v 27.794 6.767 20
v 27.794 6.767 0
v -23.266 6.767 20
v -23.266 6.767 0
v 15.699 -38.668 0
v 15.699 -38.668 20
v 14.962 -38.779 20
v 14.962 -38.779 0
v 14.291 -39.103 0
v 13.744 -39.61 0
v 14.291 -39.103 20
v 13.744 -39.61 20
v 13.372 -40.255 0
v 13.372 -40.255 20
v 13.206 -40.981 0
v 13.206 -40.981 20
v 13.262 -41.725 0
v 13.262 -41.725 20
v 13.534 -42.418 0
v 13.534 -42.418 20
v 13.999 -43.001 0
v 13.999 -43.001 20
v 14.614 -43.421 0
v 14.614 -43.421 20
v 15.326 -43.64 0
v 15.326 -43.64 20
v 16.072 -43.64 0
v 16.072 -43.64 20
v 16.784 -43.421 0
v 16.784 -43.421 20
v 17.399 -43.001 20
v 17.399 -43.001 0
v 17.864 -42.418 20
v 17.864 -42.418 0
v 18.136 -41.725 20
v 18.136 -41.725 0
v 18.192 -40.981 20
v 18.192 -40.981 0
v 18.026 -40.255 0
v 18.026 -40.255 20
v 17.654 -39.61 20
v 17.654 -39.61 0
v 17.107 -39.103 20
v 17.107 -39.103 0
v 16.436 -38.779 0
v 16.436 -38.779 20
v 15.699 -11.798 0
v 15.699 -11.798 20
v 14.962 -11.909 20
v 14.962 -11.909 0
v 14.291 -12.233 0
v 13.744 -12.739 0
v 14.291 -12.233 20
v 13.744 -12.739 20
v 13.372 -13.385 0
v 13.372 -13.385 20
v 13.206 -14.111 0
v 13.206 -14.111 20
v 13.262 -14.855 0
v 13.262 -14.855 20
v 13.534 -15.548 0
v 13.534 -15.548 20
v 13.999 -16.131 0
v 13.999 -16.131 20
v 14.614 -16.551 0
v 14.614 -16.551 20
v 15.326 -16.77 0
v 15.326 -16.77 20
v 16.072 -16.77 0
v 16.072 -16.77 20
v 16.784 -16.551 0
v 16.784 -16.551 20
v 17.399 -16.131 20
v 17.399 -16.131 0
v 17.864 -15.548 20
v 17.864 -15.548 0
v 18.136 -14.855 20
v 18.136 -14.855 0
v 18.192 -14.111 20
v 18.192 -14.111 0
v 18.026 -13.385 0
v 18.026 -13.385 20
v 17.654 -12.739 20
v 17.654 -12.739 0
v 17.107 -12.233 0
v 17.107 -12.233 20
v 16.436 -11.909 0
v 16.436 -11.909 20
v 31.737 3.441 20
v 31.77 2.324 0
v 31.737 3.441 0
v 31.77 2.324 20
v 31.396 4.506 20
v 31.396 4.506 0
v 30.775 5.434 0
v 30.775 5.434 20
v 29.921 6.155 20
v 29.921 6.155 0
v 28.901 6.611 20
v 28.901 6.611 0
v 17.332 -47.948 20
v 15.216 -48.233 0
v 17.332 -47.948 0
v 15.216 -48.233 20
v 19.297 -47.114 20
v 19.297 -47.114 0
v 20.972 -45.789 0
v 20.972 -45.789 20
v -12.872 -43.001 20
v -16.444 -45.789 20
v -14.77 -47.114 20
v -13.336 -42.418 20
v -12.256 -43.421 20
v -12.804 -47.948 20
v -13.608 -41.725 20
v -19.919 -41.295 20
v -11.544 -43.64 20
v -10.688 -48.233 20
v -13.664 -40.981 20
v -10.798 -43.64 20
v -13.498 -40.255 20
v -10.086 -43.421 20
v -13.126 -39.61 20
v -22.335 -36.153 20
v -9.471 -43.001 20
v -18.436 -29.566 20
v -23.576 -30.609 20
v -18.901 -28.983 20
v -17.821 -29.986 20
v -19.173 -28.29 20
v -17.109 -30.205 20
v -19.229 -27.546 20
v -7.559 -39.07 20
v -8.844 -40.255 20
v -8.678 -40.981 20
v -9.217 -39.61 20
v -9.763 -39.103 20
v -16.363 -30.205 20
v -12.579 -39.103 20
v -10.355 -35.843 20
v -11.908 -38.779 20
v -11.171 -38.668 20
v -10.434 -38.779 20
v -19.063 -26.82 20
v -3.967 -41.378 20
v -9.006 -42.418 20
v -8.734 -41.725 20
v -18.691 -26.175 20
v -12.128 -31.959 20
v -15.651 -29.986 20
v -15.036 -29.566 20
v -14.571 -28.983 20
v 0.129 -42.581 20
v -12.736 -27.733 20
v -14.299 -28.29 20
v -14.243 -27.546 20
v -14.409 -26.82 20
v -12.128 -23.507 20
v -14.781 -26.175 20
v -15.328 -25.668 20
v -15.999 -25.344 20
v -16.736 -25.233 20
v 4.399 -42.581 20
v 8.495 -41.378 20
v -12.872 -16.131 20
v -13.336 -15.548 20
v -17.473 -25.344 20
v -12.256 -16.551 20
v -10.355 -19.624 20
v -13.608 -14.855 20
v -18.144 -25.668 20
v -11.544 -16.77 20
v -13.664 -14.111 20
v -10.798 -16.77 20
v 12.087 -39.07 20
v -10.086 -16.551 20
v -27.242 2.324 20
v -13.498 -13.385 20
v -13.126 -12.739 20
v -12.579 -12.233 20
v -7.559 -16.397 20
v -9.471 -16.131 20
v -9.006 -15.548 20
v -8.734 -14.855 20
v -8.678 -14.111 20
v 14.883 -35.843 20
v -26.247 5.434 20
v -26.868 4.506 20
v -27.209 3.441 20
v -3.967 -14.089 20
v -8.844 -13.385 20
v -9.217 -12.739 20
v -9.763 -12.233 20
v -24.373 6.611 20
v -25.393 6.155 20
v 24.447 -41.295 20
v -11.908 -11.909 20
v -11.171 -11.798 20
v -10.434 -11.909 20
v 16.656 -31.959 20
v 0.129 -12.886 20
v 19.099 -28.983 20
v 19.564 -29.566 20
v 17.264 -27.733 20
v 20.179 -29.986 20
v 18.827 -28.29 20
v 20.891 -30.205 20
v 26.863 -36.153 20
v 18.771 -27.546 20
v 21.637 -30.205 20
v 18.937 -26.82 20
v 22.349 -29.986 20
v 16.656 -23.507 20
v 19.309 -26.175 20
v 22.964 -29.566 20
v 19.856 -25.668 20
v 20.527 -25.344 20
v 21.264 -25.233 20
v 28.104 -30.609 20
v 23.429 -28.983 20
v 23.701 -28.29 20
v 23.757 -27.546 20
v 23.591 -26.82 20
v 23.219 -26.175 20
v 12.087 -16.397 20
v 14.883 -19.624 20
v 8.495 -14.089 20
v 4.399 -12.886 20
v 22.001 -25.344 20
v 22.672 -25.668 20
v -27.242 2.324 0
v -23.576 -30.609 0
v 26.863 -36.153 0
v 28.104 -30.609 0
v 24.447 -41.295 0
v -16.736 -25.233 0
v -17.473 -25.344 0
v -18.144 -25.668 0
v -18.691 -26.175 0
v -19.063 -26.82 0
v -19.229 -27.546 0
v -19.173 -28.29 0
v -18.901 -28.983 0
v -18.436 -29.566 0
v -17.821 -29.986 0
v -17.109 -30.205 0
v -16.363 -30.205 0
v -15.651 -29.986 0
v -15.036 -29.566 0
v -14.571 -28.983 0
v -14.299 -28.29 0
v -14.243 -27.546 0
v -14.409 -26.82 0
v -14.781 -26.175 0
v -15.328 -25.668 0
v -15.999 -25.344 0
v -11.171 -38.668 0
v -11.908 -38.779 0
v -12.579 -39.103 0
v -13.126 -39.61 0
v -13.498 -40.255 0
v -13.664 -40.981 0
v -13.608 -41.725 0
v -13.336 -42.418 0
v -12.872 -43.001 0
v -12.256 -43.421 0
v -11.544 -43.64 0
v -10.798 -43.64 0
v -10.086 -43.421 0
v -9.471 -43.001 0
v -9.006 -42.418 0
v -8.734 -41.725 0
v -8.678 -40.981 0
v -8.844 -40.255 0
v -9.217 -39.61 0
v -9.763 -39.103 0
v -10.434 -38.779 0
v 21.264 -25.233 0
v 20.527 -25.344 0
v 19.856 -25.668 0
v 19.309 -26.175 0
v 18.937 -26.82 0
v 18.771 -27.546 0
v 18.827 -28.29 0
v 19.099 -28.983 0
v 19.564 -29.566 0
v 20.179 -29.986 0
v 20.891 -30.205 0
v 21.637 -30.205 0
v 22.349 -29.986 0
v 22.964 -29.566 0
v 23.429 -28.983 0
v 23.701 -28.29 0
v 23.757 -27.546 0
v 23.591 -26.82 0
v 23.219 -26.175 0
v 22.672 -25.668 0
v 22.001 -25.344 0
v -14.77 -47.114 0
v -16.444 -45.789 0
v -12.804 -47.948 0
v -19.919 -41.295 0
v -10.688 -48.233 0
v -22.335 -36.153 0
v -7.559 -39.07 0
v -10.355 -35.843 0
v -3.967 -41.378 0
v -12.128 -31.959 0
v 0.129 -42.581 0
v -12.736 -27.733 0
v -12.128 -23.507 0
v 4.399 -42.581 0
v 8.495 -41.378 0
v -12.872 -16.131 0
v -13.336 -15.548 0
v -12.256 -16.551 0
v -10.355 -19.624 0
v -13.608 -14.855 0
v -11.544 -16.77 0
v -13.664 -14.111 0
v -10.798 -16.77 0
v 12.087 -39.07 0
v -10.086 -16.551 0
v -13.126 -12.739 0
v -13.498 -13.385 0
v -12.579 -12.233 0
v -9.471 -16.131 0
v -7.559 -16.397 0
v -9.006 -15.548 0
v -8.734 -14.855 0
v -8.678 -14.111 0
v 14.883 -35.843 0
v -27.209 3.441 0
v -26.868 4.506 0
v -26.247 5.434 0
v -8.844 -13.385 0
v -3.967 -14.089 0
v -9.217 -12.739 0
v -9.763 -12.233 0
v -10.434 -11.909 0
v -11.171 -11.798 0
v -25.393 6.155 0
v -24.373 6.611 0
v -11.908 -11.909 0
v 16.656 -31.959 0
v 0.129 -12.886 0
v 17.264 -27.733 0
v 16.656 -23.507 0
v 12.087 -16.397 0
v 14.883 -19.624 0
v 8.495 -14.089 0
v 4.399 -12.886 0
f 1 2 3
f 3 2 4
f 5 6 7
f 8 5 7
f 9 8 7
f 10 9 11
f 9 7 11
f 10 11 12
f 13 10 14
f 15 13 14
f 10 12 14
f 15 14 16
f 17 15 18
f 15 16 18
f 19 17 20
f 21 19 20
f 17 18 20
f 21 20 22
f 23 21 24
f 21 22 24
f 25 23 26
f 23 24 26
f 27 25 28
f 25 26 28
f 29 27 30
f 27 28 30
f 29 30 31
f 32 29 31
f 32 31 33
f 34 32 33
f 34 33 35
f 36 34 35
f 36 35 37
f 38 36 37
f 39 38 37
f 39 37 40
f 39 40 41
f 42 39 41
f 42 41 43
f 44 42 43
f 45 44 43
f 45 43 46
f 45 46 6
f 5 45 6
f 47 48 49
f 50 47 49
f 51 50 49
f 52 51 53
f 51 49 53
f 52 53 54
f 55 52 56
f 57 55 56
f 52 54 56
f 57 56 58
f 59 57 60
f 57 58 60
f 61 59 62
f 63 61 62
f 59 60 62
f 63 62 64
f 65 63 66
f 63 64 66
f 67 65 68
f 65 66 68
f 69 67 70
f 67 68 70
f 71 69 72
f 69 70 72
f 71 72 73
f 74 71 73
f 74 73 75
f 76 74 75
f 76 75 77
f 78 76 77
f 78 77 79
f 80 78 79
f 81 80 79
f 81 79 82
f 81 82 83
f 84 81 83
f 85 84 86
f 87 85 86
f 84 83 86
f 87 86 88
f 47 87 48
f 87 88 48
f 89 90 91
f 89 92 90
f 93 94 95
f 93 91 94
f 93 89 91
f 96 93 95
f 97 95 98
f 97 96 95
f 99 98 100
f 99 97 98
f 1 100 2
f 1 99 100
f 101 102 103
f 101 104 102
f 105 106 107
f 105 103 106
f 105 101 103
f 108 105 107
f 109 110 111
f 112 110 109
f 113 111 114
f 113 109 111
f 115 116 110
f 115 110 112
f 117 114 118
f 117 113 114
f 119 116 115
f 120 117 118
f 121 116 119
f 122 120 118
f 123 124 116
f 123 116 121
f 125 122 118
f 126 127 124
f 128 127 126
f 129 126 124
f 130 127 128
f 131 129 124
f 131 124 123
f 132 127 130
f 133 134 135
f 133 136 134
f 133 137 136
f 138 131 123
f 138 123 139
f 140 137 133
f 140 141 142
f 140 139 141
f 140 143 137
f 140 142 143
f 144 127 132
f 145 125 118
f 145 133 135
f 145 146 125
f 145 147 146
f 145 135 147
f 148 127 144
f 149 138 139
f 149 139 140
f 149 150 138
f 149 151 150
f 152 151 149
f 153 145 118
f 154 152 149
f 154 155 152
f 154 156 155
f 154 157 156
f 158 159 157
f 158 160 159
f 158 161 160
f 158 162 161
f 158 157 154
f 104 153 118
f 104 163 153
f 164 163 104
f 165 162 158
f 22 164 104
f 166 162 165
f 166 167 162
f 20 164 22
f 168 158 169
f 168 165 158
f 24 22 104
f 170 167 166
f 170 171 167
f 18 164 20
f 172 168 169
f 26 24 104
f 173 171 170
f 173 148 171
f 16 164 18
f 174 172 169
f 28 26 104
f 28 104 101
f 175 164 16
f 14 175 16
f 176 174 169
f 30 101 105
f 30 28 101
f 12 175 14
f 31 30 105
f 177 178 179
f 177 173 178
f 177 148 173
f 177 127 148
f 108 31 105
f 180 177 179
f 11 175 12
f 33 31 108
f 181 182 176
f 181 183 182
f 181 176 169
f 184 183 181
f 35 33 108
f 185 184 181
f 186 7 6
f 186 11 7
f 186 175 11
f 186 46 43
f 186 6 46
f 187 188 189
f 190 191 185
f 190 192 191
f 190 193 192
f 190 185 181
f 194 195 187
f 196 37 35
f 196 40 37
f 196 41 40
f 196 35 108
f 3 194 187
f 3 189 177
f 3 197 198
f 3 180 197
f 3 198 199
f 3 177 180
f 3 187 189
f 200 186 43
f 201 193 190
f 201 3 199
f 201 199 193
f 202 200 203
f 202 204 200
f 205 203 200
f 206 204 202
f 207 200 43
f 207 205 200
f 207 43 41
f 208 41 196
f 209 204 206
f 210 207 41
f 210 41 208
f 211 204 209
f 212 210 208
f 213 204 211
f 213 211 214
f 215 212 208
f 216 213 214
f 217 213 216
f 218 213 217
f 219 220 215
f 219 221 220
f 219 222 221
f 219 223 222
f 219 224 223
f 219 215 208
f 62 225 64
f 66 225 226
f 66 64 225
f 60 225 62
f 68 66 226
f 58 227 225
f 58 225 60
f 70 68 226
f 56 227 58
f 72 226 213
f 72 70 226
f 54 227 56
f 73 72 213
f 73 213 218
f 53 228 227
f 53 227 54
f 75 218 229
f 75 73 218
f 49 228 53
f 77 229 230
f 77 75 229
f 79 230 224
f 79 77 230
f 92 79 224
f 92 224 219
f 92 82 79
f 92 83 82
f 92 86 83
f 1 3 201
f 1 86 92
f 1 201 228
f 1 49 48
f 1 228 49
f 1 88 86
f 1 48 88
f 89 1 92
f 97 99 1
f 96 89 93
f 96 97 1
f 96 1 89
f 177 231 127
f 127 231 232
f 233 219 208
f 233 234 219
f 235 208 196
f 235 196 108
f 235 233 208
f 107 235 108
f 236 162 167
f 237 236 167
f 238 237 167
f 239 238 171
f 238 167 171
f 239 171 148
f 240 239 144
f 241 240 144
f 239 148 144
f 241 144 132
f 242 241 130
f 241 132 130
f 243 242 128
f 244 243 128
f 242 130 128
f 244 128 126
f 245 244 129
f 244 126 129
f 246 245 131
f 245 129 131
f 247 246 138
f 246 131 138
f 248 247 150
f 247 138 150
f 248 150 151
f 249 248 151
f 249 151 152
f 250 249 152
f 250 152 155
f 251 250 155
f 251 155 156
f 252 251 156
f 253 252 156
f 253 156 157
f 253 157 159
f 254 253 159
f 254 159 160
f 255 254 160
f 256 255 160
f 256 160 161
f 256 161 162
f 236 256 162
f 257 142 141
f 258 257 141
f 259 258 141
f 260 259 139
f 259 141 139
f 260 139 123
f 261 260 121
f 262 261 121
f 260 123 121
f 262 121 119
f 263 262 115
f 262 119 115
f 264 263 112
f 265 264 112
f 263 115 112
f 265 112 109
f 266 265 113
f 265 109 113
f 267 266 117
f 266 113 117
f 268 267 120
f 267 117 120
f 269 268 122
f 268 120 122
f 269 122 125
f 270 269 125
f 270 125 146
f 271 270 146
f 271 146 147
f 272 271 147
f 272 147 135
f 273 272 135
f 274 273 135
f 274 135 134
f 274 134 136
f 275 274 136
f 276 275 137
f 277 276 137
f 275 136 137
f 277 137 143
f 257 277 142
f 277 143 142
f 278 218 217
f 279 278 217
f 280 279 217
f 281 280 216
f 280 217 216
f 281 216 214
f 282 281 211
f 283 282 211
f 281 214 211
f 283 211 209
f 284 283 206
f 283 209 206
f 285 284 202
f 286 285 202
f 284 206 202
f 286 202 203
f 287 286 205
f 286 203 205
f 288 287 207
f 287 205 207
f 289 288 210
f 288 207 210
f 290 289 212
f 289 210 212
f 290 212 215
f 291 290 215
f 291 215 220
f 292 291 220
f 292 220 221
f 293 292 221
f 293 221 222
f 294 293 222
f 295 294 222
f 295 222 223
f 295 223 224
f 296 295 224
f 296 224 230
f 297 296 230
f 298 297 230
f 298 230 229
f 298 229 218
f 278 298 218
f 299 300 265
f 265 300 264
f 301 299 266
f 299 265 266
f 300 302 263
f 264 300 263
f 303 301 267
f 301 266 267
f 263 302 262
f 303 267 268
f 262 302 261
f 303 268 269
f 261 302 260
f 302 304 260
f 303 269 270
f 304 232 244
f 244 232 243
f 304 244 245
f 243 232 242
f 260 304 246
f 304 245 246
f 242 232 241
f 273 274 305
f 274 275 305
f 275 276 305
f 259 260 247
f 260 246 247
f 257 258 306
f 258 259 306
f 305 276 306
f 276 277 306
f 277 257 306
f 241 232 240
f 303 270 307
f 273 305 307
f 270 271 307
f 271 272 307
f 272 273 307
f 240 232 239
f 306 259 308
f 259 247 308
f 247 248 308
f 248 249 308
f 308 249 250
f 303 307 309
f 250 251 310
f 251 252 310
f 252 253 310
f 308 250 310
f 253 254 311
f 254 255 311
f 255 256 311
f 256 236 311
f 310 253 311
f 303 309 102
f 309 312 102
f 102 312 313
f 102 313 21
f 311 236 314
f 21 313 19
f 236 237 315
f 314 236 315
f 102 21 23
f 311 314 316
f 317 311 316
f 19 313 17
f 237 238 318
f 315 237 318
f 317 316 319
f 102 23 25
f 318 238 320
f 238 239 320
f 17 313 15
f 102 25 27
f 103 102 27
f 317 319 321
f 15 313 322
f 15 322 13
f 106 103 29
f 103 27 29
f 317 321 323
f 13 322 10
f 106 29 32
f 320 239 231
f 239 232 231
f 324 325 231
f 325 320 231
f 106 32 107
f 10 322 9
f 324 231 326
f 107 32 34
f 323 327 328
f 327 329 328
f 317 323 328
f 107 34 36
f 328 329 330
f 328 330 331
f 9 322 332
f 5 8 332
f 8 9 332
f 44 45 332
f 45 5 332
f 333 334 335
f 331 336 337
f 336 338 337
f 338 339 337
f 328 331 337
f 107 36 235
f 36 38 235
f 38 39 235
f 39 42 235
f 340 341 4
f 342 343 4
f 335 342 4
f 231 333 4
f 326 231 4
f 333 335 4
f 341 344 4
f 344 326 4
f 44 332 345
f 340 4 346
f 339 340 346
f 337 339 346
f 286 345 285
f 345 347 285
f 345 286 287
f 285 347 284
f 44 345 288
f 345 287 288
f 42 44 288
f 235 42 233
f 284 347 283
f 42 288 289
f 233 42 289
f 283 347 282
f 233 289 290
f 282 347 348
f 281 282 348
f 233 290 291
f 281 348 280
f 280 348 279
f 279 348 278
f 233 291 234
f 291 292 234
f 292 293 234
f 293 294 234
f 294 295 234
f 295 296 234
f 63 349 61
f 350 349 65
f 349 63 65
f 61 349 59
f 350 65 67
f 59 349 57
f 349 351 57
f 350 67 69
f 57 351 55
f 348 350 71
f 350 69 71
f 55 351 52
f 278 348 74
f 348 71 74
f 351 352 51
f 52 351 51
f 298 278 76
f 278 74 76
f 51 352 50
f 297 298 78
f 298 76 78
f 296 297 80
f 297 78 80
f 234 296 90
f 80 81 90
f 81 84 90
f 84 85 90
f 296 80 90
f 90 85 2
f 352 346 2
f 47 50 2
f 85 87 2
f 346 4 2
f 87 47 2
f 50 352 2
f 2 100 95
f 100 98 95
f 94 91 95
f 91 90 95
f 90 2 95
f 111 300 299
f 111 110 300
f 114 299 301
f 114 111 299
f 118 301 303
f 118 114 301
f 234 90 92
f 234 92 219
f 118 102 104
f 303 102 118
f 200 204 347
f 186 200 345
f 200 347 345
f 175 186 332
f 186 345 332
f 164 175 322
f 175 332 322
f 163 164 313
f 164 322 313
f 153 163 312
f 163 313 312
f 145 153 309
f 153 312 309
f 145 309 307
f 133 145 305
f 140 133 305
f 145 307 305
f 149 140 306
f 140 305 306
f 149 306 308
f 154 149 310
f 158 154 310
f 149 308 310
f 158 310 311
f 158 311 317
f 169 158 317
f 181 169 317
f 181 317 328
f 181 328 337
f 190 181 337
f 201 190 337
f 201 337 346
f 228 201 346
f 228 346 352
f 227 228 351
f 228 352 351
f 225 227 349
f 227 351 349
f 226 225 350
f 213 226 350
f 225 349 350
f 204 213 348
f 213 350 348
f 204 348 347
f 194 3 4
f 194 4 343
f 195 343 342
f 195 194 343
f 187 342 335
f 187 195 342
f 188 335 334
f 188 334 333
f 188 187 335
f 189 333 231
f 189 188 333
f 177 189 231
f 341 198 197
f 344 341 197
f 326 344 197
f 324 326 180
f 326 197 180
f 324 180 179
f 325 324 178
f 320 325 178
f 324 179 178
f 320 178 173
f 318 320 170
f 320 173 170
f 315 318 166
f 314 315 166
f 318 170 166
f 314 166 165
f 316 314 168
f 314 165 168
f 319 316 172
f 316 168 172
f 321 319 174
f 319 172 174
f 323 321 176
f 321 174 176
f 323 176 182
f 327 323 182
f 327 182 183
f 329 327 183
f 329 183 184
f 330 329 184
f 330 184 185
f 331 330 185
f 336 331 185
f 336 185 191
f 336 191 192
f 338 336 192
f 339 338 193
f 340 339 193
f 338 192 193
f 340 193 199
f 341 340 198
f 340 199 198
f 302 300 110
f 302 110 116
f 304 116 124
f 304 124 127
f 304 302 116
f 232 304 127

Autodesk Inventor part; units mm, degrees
ref_plane "YZ Plane" through (0, 0, 0) normal (1, 0, 0) x (0, 1, 0)
ref_plane "XZ Plane" through (0, 0, 0) normal (0, 1, 0) x (-1, 0, 0)
ref_plane "XY Plane" through (0, 0, 0) normal (0, 0, 1) x (1, 0, 0)
sketch "Szkic1" plane through (0, 0, 0) normal (0, 0, 1) x (1, 0, 0)
  line L0 (-47.736, 26.7667) -> (-47.736, 6.7667)
  line L1 (-47.736, 26.7667) -> (52.264, 26.7667)
  line L2 (52.264, 26.7667) -> (52.264, 6.7667)
  line L3 (52.264, 6.7667) -> (32.264, 6.7667)
  line L4 (32.264, 6.7667) -> (32.264, -48.2333)
  line L5 (32.264, -48.2333) -> (-27.736, -48.2333)
  line L6 (-27.736, -48.2333) -> (-27.736, 6.7667)
  line L7 (-27.736, 6.7667) -> (-47.736, 6.7667)
  circle A0 centre (2.264, -27.7333) radius 19
  arc A1 (-11.0025, -7.7333) -> (-11.0025, -47.7333) centre (2.264, -27.7333) ccw
  line L8 (-11.0025, -47.7333) -> (15.5305, -47.7333)
  arc A2 (15.5305, -47.7333) -> (15.5305, -7.7333) centre (2.264, -27.7333) ccw
  line L9 (15.5305, -7.7333) -> (-11.0025, -7.7333)
  circle A3 centre (2.264, -27.7333) radius 15
  circle A4 centre (-37.736, 16.7667) radius 2
  circle A5 centre (2.264, 16.7667) radius 2
  circle A6 centre (42.264, 16.7667) radius 2
  arc A7 (-23.5765, -30.609) -> (-13.7282, -48.2333) centre (2.264, -27.7333) ccw
  arc A8 (18.2561, -48.2333) -> (28.1044, -30.609) centre (2.264, -27.7333) ccw
  line L10 (-27.736, 6.7667) -> (-23.5765, -30.609)
  line L11 (32.264, 6.7667) -> (28.1044, -30.609)
  line L12 (-7.736, 26.7667) -> (-7.736, 66.7667)
  line L13 (-7.736, 66.7667) -> (12.264, 66.7667)
  line L14 (12.264, 66.7667) -> (12.264, 26.7667)
  circle A9 centre (2.264, 56.7667) radius 2
  line L15 (-27.736, 6.7667) -> (32.264, 6.7667)
  point P0 (0, 0)
  point P1 (-16.736, -27.7333)
  point P2 (-11.1711, -41.1683)
  point P3 (15.699, -14.2982)
  point P4 (15.699, -41.1683)
  point P5 (-11.1711, -14.2982)
  point P6 (21.264, -27.7333)
  dimension "d0" = 20
  dimension "d1" = 100
  dimension "d2" = 20
  dimension "d3" = 60
  dimension "d4" = 20
  dimension "d5" = 55
  dimension "d8" = 38
  dimension "d13" = 34.5
  dimension "d14" = 30
  dimension "d15" = 30
  dimension "d24" = 4
  dimension "d25" = 4
  dimension "d26" = 4
  dimension "d29" = 10
  dimension "d30" = 10
  dimension "d31" = 10
  dimension "d32" = 10
  dimension "d33" = 10
  dimension "d34" = 50
  dimension "d42" = 2
  dimension "d47" = 40
  dimension "d48" = 20
  dimension "d49" = 40
  dimension "d50" = 10
  dimension "d51" = 10
  dimension "d52" = 4
extrude "Wyciągnięcie proste1" add sketch "Szkic1" along normal blind 20 contours L1 L2 L3 L15 L7 L0 | L12 L13 L14 L1 | L10 A7 L5 L6 | L15 L11 A8 L5 A7 L10 | L4 L5 A8 L11 | A0 | L9 A2 L8 A1 | A3 | A4 | A5 | A6 | A9
extrude "Wyciągnięcie proste2" cut sketch "Szkic1" along normal through all contours A3 | A4 | A5 | A6 | A9
hole "Otwór1" at (2.264, -27.7333, 0) at (21.264, -27.7333, 0) at (-11.1711, -41.1683, 0) at (15.699, -41.1683, 0) at (15.699, -14.2982, 0) at (-11.1711, -14.2982, 0) at (-16.736, -27.7333, 0) direction (0, 0, 1) diameter 5 end through all
extrude "Wyciągnięcie proste3" cut sketch "Szkic1" along normal through all contours L10 A7 L5 L6 | L4 L5 A8 L11
extrude "Wyciągnięcie proste4" cut sketch "Szkic1" along normal through all contours L1 L2 L3 L15 L7 L0 | L12 L13 L14 L1
fillet "Zaokrąglenie3" radius 4 2 edges at (32.264, 6.7667, 10) (-27.736, 6.7667, 10)
fillet "Zaokrąglenie4" radius 8 2 edges at (-13.7282, -48.2333, 10) (18.2561, -48.2333, 10)
equation "\"d2\" = -0.5 * d3 + 0.5 * d1"
equation "\"d14\" = 0.5 * d3"
equation "\"d34\" = 0.5 * d1"
properties part number "3DP_ABS_Heatbed_Frame_Ball_Screw_Nut_Mounting_Bracket_Filler"
